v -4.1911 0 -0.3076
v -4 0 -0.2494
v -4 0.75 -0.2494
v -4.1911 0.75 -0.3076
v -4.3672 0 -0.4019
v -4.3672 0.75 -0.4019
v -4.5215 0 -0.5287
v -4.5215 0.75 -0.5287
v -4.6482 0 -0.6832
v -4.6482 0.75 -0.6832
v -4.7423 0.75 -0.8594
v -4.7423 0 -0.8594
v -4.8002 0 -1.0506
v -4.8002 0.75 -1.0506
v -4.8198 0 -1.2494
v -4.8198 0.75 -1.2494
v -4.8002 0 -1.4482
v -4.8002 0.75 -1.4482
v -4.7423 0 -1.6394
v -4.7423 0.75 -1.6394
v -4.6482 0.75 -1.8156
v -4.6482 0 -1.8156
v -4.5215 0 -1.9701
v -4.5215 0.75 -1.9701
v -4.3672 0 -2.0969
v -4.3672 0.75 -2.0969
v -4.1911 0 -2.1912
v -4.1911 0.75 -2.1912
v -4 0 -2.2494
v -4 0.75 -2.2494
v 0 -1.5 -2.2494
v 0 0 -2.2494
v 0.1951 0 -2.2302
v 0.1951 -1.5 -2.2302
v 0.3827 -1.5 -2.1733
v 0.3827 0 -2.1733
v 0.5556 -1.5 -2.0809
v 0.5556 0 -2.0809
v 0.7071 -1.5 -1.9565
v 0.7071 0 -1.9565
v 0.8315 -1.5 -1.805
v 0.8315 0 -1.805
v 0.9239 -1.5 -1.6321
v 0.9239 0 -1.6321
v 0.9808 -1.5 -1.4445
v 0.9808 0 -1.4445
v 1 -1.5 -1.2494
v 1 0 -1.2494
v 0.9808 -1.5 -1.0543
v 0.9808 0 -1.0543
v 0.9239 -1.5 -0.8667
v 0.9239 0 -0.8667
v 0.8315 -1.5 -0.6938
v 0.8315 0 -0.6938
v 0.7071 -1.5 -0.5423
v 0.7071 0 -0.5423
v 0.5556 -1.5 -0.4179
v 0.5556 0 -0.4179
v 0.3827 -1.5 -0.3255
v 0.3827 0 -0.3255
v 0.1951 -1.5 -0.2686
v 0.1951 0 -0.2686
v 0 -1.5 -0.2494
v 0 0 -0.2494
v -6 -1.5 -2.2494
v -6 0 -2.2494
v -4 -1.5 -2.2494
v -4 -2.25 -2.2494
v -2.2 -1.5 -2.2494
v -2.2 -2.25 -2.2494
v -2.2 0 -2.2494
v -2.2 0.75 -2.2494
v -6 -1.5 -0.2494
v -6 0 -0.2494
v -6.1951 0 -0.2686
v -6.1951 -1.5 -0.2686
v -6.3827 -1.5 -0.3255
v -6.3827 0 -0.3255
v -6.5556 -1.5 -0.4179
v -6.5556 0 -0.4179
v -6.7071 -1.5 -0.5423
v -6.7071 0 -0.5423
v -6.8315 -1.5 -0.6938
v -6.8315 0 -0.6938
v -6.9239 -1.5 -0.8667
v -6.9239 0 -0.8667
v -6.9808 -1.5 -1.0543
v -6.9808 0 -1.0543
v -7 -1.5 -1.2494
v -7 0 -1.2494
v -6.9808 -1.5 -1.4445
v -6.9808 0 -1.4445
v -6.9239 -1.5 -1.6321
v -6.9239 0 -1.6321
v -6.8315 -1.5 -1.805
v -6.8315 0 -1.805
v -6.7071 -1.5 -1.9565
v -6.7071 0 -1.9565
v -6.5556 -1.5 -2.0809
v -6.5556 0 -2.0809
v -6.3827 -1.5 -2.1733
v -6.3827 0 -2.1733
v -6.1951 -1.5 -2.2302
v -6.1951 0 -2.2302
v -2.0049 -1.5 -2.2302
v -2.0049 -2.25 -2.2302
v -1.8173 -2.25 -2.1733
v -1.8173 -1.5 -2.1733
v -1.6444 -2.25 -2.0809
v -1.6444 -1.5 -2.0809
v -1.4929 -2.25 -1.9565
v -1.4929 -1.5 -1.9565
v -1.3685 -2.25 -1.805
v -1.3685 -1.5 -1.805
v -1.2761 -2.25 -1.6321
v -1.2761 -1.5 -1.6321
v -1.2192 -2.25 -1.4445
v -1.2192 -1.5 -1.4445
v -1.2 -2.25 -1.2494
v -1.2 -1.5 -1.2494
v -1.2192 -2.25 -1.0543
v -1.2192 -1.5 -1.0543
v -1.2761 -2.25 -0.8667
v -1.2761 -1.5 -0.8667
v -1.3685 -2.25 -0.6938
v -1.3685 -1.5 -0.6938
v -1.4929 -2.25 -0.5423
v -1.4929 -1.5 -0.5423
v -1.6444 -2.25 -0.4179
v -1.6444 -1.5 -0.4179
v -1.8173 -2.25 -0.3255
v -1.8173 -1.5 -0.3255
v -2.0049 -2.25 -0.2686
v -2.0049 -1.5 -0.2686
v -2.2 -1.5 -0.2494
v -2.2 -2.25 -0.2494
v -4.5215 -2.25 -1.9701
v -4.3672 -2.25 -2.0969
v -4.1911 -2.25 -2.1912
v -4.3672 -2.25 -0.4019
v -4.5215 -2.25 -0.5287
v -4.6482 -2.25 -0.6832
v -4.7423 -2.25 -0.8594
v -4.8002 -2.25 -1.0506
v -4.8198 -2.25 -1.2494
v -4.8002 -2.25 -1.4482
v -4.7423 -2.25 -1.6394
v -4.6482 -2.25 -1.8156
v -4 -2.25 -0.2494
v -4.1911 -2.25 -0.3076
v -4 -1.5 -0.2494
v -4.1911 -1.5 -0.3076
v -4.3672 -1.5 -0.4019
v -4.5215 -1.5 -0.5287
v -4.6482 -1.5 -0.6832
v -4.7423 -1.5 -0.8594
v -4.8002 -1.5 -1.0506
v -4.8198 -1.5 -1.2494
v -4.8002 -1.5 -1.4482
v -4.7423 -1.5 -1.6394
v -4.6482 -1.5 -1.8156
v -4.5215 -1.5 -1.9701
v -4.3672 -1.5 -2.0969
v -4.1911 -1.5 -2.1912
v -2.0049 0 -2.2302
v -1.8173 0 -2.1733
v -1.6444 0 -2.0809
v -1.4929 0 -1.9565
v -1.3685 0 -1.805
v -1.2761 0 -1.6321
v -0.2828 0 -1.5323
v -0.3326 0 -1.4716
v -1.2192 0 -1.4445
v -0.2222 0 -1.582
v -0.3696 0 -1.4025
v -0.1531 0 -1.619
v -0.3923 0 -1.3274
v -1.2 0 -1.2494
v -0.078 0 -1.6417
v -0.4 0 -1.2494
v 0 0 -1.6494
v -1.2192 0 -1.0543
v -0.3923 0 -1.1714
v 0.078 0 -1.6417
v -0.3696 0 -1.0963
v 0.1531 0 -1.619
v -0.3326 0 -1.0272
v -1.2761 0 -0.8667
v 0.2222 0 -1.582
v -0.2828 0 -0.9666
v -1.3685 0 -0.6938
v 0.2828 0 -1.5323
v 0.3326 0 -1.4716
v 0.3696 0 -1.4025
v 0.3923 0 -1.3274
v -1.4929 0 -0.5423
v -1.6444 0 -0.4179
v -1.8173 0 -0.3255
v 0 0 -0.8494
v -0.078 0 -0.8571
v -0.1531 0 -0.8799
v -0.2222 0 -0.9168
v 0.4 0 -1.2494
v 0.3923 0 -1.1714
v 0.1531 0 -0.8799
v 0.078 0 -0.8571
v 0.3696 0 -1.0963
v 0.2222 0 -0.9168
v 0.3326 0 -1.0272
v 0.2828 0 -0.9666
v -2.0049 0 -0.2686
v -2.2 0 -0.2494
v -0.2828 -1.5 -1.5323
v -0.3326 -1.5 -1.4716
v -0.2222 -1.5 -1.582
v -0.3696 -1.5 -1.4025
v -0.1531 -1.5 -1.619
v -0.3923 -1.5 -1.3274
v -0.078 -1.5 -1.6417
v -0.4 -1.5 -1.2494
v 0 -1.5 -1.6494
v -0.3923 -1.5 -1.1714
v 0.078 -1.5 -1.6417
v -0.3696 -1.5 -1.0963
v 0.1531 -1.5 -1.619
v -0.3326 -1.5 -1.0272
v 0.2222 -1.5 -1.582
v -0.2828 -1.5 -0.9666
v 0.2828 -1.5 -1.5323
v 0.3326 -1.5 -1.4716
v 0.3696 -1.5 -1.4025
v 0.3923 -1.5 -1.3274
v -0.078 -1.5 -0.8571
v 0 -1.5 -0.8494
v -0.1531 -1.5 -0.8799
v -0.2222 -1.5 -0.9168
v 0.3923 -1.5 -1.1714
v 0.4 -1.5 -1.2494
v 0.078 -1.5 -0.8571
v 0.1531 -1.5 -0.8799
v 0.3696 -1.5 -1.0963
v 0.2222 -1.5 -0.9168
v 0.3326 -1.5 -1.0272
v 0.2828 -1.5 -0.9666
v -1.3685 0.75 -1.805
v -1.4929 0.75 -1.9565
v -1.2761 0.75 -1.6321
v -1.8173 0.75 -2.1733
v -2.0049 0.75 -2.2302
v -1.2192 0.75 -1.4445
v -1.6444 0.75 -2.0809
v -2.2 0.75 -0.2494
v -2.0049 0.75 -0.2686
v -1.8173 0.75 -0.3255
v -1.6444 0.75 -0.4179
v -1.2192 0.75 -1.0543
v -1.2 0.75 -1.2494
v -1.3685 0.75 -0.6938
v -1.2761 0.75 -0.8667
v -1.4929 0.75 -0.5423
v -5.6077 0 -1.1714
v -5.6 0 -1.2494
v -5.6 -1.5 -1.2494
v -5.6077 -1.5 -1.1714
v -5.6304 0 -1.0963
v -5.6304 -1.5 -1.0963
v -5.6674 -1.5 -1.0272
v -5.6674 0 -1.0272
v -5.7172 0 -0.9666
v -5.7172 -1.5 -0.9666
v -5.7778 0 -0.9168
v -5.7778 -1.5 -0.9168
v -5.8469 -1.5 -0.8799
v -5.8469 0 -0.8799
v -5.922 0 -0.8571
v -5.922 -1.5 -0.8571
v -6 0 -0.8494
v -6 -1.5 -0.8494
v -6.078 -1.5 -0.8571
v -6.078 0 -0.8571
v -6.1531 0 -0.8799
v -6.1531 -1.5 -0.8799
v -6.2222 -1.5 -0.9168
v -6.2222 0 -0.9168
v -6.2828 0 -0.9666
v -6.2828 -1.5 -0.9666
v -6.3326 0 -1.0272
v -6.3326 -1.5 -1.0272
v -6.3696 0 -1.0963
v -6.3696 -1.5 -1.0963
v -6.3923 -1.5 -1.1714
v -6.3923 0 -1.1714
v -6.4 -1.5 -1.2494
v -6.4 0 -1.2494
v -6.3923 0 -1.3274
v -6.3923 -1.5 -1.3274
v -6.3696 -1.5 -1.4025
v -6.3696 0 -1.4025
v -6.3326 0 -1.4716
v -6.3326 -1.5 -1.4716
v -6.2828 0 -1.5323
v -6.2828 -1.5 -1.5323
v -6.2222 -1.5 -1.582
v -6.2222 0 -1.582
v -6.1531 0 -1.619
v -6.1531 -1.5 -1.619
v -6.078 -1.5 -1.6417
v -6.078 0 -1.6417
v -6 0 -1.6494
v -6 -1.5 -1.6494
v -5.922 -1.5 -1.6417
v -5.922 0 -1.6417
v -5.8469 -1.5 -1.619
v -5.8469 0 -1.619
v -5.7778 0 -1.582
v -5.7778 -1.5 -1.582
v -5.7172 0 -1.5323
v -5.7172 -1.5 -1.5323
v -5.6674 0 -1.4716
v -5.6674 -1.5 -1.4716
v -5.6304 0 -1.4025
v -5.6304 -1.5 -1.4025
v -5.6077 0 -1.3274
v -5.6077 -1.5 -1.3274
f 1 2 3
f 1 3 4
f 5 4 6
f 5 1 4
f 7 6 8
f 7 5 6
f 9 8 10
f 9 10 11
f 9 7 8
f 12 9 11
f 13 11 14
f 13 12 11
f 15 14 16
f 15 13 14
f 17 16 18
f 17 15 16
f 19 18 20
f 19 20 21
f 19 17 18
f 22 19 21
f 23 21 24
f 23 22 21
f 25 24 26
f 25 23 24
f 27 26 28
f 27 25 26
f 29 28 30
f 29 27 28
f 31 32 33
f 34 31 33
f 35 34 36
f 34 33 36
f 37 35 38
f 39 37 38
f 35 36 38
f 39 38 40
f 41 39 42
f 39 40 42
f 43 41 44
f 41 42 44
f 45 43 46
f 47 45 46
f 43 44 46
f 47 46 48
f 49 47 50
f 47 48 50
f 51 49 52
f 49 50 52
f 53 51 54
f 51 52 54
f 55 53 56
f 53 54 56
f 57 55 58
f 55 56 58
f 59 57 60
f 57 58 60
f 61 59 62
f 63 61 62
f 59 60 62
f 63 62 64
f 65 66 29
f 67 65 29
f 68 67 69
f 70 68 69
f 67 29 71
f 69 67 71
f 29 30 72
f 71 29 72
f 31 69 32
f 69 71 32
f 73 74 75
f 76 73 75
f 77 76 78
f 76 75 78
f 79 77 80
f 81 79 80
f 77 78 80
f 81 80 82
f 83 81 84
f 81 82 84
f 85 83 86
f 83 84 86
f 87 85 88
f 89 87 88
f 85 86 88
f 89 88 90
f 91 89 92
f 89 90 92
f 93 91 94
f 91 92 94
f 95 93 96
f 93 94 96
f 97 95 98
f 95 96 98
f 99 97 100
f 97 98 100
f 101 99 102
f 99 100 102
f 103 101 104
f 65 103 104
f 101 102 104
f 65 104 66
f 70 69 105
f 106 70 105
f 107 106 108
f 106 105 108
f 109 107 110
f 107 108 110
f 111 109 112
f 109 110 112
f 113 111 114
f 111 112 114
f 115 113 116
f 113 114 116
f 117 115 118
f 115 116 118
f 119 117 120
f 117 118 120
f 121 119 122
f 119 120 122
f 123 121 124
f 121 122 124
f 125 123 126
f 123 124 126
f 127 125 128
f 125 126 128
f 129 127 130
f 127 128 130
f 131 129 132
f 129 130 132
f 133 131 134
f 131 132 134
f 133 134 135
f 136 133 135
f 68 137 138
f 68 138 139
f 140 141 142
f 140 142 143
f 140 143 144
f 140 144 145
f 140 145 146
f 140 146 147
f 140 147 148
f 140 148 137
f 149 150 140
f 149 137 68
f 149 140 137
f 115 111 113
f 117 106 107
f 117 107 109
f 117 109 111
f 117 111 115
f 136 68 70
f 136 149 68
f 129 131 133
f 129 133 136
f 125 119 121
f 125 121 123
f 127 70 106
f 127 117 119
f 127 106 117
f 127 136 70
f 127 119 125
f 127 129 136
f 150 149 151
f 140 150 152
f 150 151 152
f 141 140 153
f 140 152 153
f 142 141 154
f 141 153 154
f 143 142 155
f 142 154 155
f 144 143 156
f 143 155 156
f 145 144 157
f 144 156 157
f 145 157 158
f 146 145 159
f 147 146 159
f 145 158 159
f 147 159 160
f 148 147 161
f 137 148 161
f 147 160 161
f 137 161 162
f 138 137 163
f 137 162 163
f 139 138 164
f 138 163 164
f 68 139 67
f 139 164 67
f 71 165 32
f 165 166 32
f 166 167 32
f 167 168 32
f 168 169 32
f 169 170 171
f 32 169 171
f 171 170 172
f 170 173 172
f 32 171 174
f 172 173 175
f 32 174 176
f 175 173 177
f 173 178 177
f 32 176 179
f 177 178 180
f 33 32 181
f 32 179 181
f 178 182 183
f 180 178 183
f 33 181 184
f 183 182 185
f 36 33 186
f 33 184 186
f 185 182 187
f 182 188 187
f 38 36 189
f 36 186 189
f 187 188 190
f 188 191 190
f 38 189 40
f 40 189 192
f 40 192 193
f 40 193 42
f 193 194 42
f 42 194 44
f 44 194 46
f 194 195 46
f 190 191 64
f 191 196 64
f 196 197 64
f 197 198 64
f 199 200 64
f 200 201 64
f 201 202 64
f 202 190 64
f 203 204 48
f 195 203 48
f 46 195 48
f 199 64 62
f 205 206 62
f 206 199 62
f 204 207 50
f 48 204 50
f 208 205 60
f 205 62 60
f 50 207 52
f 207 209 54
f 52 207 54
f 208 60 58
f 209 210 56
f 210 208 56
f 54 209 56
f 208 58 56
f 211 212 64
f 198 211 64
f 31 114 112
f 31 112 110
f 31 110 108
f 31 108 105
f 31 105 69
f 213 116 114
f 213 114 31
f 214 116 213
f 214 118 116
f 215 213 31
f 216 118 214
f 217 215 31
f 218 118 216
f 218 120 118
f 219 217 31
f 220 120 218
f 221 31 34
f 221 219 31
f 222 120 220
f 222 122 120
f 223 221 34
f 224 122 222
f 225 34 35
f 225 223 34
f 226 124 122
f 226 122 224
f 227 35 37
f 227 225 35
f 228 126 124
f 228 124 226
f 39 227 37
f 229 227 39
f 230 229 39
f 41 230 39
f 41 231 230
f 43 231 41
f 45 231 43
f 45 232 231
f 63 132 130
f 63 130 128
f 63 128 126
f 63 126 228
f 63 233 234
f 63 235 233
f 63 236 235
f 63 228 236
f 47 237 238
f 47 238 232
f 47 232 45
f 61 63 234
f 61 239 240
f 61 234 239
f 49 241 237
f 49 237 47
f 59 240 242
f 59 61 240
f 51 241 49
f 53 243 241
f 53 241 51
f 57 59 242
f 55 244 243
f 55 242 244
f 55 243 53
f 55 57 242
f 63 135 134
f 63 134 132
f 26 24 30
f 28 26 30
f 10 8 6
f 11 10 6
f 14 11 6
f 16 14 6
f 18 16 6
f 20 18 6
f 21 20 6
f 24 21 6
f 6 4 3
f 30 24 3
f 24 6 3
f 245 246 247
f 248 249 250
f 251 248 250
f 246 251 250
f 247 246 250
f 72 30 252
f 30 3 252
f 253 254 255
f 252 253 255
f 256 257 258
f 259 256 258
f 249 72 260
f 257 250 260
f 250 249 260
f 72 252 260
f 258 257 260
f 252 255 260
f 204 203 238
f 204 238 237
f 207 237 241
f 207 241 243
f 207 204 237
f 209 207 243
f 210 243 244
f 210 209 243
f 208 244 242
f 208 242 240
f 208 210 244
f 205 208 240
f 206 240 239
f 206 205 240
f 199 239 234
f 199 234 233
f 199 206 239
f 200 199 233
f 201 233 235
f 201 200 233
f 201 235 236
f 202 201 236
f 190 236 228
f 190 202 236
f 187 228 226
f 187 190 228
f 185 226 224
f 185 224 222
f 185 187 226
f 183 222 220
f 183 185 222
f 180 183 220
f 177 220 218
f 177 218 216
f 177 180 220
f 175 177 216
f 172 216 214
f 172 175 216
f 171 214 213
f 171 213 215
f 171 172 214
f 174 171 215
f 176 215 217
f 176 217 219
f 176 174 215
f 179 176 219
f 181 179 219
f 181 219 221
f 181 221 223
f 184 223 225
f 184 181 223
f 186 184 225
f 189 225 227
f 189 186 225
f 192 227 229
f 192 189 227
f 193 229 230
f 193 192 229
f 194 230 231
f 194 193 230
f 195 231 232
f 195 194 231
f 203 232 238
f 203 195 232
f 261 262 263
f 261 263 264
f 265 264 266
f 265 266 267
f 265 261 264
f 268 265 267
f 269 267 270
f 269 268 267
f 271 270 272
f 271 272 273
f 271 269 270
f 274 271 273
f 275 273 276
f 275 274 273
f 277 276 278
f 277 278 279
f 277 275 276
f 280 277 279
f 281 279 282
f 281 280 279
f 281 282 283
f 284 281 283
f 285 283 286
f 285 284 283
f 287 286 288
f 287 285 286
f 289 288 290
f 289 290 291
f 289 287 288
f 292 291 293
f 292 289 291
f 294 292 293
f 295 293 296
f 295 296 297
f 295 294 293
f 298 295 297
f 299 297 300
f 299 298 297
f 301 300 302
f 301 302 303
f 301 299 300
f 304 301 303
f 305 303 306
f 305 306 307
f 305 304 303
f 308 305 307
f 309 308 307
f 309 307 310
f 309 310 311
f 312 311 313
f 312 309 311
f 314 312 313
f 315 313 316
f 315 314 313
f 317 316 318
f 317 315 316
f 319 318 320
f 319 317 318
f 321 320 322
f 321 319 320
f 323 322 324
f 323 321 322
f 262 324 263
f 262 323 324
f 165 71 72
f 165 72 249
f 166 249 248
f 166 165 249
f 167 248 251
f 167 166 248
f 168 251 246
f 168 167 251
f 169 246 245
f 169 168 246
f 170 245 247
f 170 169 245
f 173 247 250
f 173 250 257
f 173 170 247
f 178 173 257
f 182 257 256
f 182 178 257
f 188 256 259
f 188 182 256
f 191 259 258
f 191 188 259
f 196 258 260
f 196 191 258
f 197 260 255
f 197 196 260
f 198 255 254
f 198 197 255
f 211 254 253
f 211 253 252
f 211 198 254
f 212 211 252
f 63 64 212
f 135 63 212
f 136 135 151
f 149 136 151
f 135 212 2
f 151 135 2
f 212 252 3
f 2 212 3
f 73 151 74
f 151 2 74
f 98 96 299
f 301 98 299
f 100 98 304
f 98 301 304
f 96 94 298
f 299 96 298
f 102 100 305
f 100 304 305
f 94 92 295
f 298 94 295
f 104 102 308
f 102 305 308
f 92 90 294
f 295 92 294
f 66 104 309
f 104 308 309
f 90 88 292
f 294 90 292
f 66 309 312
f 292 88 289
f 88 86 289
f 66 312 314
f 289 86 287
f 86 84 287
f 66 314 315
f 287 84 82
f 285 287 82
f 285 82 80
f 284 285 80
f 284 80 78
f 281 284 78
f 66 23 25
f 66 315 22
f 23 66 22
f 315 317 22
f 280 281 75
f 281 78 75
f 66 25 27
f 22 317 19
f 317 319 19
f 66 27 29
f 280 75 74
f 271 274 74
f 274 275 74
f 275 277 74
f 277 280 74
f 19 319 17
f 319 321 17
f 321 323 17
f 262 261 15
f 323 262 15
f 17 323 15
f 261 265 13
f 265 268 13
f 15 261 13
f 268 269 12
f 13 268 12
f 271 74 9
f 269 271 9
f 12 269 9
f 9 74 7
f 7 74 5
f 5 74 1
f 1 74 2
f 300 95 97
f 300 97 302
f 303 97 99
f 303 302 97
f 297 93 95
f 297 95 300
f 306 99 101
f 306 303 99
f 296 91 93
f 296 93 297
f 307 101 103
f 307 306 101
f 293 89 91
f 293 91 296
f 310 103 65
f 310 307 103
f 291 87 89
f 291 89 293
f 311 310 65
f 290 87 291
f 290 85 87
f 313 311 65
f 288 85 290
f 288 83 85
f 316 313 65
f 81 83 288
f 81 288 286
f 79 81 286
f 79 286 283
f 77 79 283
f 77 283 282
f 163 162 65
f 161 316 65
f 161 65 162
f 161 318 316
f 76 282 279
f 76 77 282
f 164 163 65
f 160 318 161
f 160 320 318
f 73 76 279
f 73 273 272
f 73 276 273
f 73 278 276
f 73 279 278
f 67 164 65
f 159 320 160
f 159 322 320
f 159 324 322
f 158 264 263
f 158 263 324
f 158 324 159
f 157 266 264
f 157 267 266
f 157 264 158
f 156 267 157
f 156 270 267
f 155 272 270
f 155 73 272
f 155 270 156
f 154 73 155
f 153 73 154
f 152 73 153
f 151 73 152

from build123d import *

# Parameters (mm, degrees)
F0_R          = 0.4
F1_DEPTH      = 1.5
F2_DEPTH      = 0.75
F2_DEPTH_BACK = 2.25


# Not quite as in the source:
# - a feature names something its author has since deleted; it is built from what else it names


with BuildPart() as f1:
    # F0 (on Front) → F1 (new body)
    with BuildSketch(Plane.XZ):
        with BuildLine():
            ThreePointArc((-2.2, -2.24940907), (-1.2, -1.24940907), (-2.2, -0.24940907))
            Line((-2.2, -0.24940907), (-4, -0.24940907))
            ThreePointArc((-4, -0.24940907), (-4.8198039027, -1.24940907), (-4, -2.24940907))
            Line((-4, -2.24940907), (-2.2, -2.24940907))
        make_face()
        with BuildLine():
            Line((0, -0.24940907), (-1, -0.24940907))
            Line((-1, -0.24940907), (-2.2, -0.24940907))
            ThreePointArc((-2.2, -0.24940907), (-1.2, -1.24940907), (-2.2, -2.24940907))
            Line((-2.2, -2.24940907), (-1, -2.24940907))
            Line((-1, -2.24940907), (0, -2.24940907))
            ThreePointArc((0, -2.24940907), (1, -1.24940907), (0, -0.24940907))
        make_face()
        with Locations((0, -1.24940907)):
            Circle(F0_R, mode=Mode.SUBTRACT)
        with BuildLine():
            ThreePointArc((-4, -2.24940907), (-4.8198039027, -1.24940907), (-4, -0.24940907))
            Line((-4, -0.24940907), (-6, -0.24940907))
            ThreePointArc((-6, -0.24940907), (-7, -1.24940907), (-6, -2.24940907))
            Line((-6, -2.24940907), (-4, -2.24940907))
        make_face()
        with Locations((-6, -1.24940907)):
            Circle(F0_R, mode=Mode.SUBTRACT)
    extrude(amount=F1_DEPTH)

    # F0 (on Front) → F2 (join, two sides)
    with BuildSketch(Plane.XZ) as f2_sk:
        with BuildLine():
            ThreePointArc((-2.2, -2.24940907), (-1.2, -1.24940907), (-2.2, -0.24940907))
            Line((-2.2, -0.24940907), (-4, -0.24940907))
            ThreePointArc((-4, -0.24940907), (-4.8198039027, -1.24940907), (-4, -2.24940907))
            Line((-4, -2.24940907), (-2.2, -2.24940907))
        make_face()
    extrude(amount=-F2_DEPTH)
    extrude(f2_sk.sketch, amount=F2_DEPTH_BACK)


solid = f1.part
